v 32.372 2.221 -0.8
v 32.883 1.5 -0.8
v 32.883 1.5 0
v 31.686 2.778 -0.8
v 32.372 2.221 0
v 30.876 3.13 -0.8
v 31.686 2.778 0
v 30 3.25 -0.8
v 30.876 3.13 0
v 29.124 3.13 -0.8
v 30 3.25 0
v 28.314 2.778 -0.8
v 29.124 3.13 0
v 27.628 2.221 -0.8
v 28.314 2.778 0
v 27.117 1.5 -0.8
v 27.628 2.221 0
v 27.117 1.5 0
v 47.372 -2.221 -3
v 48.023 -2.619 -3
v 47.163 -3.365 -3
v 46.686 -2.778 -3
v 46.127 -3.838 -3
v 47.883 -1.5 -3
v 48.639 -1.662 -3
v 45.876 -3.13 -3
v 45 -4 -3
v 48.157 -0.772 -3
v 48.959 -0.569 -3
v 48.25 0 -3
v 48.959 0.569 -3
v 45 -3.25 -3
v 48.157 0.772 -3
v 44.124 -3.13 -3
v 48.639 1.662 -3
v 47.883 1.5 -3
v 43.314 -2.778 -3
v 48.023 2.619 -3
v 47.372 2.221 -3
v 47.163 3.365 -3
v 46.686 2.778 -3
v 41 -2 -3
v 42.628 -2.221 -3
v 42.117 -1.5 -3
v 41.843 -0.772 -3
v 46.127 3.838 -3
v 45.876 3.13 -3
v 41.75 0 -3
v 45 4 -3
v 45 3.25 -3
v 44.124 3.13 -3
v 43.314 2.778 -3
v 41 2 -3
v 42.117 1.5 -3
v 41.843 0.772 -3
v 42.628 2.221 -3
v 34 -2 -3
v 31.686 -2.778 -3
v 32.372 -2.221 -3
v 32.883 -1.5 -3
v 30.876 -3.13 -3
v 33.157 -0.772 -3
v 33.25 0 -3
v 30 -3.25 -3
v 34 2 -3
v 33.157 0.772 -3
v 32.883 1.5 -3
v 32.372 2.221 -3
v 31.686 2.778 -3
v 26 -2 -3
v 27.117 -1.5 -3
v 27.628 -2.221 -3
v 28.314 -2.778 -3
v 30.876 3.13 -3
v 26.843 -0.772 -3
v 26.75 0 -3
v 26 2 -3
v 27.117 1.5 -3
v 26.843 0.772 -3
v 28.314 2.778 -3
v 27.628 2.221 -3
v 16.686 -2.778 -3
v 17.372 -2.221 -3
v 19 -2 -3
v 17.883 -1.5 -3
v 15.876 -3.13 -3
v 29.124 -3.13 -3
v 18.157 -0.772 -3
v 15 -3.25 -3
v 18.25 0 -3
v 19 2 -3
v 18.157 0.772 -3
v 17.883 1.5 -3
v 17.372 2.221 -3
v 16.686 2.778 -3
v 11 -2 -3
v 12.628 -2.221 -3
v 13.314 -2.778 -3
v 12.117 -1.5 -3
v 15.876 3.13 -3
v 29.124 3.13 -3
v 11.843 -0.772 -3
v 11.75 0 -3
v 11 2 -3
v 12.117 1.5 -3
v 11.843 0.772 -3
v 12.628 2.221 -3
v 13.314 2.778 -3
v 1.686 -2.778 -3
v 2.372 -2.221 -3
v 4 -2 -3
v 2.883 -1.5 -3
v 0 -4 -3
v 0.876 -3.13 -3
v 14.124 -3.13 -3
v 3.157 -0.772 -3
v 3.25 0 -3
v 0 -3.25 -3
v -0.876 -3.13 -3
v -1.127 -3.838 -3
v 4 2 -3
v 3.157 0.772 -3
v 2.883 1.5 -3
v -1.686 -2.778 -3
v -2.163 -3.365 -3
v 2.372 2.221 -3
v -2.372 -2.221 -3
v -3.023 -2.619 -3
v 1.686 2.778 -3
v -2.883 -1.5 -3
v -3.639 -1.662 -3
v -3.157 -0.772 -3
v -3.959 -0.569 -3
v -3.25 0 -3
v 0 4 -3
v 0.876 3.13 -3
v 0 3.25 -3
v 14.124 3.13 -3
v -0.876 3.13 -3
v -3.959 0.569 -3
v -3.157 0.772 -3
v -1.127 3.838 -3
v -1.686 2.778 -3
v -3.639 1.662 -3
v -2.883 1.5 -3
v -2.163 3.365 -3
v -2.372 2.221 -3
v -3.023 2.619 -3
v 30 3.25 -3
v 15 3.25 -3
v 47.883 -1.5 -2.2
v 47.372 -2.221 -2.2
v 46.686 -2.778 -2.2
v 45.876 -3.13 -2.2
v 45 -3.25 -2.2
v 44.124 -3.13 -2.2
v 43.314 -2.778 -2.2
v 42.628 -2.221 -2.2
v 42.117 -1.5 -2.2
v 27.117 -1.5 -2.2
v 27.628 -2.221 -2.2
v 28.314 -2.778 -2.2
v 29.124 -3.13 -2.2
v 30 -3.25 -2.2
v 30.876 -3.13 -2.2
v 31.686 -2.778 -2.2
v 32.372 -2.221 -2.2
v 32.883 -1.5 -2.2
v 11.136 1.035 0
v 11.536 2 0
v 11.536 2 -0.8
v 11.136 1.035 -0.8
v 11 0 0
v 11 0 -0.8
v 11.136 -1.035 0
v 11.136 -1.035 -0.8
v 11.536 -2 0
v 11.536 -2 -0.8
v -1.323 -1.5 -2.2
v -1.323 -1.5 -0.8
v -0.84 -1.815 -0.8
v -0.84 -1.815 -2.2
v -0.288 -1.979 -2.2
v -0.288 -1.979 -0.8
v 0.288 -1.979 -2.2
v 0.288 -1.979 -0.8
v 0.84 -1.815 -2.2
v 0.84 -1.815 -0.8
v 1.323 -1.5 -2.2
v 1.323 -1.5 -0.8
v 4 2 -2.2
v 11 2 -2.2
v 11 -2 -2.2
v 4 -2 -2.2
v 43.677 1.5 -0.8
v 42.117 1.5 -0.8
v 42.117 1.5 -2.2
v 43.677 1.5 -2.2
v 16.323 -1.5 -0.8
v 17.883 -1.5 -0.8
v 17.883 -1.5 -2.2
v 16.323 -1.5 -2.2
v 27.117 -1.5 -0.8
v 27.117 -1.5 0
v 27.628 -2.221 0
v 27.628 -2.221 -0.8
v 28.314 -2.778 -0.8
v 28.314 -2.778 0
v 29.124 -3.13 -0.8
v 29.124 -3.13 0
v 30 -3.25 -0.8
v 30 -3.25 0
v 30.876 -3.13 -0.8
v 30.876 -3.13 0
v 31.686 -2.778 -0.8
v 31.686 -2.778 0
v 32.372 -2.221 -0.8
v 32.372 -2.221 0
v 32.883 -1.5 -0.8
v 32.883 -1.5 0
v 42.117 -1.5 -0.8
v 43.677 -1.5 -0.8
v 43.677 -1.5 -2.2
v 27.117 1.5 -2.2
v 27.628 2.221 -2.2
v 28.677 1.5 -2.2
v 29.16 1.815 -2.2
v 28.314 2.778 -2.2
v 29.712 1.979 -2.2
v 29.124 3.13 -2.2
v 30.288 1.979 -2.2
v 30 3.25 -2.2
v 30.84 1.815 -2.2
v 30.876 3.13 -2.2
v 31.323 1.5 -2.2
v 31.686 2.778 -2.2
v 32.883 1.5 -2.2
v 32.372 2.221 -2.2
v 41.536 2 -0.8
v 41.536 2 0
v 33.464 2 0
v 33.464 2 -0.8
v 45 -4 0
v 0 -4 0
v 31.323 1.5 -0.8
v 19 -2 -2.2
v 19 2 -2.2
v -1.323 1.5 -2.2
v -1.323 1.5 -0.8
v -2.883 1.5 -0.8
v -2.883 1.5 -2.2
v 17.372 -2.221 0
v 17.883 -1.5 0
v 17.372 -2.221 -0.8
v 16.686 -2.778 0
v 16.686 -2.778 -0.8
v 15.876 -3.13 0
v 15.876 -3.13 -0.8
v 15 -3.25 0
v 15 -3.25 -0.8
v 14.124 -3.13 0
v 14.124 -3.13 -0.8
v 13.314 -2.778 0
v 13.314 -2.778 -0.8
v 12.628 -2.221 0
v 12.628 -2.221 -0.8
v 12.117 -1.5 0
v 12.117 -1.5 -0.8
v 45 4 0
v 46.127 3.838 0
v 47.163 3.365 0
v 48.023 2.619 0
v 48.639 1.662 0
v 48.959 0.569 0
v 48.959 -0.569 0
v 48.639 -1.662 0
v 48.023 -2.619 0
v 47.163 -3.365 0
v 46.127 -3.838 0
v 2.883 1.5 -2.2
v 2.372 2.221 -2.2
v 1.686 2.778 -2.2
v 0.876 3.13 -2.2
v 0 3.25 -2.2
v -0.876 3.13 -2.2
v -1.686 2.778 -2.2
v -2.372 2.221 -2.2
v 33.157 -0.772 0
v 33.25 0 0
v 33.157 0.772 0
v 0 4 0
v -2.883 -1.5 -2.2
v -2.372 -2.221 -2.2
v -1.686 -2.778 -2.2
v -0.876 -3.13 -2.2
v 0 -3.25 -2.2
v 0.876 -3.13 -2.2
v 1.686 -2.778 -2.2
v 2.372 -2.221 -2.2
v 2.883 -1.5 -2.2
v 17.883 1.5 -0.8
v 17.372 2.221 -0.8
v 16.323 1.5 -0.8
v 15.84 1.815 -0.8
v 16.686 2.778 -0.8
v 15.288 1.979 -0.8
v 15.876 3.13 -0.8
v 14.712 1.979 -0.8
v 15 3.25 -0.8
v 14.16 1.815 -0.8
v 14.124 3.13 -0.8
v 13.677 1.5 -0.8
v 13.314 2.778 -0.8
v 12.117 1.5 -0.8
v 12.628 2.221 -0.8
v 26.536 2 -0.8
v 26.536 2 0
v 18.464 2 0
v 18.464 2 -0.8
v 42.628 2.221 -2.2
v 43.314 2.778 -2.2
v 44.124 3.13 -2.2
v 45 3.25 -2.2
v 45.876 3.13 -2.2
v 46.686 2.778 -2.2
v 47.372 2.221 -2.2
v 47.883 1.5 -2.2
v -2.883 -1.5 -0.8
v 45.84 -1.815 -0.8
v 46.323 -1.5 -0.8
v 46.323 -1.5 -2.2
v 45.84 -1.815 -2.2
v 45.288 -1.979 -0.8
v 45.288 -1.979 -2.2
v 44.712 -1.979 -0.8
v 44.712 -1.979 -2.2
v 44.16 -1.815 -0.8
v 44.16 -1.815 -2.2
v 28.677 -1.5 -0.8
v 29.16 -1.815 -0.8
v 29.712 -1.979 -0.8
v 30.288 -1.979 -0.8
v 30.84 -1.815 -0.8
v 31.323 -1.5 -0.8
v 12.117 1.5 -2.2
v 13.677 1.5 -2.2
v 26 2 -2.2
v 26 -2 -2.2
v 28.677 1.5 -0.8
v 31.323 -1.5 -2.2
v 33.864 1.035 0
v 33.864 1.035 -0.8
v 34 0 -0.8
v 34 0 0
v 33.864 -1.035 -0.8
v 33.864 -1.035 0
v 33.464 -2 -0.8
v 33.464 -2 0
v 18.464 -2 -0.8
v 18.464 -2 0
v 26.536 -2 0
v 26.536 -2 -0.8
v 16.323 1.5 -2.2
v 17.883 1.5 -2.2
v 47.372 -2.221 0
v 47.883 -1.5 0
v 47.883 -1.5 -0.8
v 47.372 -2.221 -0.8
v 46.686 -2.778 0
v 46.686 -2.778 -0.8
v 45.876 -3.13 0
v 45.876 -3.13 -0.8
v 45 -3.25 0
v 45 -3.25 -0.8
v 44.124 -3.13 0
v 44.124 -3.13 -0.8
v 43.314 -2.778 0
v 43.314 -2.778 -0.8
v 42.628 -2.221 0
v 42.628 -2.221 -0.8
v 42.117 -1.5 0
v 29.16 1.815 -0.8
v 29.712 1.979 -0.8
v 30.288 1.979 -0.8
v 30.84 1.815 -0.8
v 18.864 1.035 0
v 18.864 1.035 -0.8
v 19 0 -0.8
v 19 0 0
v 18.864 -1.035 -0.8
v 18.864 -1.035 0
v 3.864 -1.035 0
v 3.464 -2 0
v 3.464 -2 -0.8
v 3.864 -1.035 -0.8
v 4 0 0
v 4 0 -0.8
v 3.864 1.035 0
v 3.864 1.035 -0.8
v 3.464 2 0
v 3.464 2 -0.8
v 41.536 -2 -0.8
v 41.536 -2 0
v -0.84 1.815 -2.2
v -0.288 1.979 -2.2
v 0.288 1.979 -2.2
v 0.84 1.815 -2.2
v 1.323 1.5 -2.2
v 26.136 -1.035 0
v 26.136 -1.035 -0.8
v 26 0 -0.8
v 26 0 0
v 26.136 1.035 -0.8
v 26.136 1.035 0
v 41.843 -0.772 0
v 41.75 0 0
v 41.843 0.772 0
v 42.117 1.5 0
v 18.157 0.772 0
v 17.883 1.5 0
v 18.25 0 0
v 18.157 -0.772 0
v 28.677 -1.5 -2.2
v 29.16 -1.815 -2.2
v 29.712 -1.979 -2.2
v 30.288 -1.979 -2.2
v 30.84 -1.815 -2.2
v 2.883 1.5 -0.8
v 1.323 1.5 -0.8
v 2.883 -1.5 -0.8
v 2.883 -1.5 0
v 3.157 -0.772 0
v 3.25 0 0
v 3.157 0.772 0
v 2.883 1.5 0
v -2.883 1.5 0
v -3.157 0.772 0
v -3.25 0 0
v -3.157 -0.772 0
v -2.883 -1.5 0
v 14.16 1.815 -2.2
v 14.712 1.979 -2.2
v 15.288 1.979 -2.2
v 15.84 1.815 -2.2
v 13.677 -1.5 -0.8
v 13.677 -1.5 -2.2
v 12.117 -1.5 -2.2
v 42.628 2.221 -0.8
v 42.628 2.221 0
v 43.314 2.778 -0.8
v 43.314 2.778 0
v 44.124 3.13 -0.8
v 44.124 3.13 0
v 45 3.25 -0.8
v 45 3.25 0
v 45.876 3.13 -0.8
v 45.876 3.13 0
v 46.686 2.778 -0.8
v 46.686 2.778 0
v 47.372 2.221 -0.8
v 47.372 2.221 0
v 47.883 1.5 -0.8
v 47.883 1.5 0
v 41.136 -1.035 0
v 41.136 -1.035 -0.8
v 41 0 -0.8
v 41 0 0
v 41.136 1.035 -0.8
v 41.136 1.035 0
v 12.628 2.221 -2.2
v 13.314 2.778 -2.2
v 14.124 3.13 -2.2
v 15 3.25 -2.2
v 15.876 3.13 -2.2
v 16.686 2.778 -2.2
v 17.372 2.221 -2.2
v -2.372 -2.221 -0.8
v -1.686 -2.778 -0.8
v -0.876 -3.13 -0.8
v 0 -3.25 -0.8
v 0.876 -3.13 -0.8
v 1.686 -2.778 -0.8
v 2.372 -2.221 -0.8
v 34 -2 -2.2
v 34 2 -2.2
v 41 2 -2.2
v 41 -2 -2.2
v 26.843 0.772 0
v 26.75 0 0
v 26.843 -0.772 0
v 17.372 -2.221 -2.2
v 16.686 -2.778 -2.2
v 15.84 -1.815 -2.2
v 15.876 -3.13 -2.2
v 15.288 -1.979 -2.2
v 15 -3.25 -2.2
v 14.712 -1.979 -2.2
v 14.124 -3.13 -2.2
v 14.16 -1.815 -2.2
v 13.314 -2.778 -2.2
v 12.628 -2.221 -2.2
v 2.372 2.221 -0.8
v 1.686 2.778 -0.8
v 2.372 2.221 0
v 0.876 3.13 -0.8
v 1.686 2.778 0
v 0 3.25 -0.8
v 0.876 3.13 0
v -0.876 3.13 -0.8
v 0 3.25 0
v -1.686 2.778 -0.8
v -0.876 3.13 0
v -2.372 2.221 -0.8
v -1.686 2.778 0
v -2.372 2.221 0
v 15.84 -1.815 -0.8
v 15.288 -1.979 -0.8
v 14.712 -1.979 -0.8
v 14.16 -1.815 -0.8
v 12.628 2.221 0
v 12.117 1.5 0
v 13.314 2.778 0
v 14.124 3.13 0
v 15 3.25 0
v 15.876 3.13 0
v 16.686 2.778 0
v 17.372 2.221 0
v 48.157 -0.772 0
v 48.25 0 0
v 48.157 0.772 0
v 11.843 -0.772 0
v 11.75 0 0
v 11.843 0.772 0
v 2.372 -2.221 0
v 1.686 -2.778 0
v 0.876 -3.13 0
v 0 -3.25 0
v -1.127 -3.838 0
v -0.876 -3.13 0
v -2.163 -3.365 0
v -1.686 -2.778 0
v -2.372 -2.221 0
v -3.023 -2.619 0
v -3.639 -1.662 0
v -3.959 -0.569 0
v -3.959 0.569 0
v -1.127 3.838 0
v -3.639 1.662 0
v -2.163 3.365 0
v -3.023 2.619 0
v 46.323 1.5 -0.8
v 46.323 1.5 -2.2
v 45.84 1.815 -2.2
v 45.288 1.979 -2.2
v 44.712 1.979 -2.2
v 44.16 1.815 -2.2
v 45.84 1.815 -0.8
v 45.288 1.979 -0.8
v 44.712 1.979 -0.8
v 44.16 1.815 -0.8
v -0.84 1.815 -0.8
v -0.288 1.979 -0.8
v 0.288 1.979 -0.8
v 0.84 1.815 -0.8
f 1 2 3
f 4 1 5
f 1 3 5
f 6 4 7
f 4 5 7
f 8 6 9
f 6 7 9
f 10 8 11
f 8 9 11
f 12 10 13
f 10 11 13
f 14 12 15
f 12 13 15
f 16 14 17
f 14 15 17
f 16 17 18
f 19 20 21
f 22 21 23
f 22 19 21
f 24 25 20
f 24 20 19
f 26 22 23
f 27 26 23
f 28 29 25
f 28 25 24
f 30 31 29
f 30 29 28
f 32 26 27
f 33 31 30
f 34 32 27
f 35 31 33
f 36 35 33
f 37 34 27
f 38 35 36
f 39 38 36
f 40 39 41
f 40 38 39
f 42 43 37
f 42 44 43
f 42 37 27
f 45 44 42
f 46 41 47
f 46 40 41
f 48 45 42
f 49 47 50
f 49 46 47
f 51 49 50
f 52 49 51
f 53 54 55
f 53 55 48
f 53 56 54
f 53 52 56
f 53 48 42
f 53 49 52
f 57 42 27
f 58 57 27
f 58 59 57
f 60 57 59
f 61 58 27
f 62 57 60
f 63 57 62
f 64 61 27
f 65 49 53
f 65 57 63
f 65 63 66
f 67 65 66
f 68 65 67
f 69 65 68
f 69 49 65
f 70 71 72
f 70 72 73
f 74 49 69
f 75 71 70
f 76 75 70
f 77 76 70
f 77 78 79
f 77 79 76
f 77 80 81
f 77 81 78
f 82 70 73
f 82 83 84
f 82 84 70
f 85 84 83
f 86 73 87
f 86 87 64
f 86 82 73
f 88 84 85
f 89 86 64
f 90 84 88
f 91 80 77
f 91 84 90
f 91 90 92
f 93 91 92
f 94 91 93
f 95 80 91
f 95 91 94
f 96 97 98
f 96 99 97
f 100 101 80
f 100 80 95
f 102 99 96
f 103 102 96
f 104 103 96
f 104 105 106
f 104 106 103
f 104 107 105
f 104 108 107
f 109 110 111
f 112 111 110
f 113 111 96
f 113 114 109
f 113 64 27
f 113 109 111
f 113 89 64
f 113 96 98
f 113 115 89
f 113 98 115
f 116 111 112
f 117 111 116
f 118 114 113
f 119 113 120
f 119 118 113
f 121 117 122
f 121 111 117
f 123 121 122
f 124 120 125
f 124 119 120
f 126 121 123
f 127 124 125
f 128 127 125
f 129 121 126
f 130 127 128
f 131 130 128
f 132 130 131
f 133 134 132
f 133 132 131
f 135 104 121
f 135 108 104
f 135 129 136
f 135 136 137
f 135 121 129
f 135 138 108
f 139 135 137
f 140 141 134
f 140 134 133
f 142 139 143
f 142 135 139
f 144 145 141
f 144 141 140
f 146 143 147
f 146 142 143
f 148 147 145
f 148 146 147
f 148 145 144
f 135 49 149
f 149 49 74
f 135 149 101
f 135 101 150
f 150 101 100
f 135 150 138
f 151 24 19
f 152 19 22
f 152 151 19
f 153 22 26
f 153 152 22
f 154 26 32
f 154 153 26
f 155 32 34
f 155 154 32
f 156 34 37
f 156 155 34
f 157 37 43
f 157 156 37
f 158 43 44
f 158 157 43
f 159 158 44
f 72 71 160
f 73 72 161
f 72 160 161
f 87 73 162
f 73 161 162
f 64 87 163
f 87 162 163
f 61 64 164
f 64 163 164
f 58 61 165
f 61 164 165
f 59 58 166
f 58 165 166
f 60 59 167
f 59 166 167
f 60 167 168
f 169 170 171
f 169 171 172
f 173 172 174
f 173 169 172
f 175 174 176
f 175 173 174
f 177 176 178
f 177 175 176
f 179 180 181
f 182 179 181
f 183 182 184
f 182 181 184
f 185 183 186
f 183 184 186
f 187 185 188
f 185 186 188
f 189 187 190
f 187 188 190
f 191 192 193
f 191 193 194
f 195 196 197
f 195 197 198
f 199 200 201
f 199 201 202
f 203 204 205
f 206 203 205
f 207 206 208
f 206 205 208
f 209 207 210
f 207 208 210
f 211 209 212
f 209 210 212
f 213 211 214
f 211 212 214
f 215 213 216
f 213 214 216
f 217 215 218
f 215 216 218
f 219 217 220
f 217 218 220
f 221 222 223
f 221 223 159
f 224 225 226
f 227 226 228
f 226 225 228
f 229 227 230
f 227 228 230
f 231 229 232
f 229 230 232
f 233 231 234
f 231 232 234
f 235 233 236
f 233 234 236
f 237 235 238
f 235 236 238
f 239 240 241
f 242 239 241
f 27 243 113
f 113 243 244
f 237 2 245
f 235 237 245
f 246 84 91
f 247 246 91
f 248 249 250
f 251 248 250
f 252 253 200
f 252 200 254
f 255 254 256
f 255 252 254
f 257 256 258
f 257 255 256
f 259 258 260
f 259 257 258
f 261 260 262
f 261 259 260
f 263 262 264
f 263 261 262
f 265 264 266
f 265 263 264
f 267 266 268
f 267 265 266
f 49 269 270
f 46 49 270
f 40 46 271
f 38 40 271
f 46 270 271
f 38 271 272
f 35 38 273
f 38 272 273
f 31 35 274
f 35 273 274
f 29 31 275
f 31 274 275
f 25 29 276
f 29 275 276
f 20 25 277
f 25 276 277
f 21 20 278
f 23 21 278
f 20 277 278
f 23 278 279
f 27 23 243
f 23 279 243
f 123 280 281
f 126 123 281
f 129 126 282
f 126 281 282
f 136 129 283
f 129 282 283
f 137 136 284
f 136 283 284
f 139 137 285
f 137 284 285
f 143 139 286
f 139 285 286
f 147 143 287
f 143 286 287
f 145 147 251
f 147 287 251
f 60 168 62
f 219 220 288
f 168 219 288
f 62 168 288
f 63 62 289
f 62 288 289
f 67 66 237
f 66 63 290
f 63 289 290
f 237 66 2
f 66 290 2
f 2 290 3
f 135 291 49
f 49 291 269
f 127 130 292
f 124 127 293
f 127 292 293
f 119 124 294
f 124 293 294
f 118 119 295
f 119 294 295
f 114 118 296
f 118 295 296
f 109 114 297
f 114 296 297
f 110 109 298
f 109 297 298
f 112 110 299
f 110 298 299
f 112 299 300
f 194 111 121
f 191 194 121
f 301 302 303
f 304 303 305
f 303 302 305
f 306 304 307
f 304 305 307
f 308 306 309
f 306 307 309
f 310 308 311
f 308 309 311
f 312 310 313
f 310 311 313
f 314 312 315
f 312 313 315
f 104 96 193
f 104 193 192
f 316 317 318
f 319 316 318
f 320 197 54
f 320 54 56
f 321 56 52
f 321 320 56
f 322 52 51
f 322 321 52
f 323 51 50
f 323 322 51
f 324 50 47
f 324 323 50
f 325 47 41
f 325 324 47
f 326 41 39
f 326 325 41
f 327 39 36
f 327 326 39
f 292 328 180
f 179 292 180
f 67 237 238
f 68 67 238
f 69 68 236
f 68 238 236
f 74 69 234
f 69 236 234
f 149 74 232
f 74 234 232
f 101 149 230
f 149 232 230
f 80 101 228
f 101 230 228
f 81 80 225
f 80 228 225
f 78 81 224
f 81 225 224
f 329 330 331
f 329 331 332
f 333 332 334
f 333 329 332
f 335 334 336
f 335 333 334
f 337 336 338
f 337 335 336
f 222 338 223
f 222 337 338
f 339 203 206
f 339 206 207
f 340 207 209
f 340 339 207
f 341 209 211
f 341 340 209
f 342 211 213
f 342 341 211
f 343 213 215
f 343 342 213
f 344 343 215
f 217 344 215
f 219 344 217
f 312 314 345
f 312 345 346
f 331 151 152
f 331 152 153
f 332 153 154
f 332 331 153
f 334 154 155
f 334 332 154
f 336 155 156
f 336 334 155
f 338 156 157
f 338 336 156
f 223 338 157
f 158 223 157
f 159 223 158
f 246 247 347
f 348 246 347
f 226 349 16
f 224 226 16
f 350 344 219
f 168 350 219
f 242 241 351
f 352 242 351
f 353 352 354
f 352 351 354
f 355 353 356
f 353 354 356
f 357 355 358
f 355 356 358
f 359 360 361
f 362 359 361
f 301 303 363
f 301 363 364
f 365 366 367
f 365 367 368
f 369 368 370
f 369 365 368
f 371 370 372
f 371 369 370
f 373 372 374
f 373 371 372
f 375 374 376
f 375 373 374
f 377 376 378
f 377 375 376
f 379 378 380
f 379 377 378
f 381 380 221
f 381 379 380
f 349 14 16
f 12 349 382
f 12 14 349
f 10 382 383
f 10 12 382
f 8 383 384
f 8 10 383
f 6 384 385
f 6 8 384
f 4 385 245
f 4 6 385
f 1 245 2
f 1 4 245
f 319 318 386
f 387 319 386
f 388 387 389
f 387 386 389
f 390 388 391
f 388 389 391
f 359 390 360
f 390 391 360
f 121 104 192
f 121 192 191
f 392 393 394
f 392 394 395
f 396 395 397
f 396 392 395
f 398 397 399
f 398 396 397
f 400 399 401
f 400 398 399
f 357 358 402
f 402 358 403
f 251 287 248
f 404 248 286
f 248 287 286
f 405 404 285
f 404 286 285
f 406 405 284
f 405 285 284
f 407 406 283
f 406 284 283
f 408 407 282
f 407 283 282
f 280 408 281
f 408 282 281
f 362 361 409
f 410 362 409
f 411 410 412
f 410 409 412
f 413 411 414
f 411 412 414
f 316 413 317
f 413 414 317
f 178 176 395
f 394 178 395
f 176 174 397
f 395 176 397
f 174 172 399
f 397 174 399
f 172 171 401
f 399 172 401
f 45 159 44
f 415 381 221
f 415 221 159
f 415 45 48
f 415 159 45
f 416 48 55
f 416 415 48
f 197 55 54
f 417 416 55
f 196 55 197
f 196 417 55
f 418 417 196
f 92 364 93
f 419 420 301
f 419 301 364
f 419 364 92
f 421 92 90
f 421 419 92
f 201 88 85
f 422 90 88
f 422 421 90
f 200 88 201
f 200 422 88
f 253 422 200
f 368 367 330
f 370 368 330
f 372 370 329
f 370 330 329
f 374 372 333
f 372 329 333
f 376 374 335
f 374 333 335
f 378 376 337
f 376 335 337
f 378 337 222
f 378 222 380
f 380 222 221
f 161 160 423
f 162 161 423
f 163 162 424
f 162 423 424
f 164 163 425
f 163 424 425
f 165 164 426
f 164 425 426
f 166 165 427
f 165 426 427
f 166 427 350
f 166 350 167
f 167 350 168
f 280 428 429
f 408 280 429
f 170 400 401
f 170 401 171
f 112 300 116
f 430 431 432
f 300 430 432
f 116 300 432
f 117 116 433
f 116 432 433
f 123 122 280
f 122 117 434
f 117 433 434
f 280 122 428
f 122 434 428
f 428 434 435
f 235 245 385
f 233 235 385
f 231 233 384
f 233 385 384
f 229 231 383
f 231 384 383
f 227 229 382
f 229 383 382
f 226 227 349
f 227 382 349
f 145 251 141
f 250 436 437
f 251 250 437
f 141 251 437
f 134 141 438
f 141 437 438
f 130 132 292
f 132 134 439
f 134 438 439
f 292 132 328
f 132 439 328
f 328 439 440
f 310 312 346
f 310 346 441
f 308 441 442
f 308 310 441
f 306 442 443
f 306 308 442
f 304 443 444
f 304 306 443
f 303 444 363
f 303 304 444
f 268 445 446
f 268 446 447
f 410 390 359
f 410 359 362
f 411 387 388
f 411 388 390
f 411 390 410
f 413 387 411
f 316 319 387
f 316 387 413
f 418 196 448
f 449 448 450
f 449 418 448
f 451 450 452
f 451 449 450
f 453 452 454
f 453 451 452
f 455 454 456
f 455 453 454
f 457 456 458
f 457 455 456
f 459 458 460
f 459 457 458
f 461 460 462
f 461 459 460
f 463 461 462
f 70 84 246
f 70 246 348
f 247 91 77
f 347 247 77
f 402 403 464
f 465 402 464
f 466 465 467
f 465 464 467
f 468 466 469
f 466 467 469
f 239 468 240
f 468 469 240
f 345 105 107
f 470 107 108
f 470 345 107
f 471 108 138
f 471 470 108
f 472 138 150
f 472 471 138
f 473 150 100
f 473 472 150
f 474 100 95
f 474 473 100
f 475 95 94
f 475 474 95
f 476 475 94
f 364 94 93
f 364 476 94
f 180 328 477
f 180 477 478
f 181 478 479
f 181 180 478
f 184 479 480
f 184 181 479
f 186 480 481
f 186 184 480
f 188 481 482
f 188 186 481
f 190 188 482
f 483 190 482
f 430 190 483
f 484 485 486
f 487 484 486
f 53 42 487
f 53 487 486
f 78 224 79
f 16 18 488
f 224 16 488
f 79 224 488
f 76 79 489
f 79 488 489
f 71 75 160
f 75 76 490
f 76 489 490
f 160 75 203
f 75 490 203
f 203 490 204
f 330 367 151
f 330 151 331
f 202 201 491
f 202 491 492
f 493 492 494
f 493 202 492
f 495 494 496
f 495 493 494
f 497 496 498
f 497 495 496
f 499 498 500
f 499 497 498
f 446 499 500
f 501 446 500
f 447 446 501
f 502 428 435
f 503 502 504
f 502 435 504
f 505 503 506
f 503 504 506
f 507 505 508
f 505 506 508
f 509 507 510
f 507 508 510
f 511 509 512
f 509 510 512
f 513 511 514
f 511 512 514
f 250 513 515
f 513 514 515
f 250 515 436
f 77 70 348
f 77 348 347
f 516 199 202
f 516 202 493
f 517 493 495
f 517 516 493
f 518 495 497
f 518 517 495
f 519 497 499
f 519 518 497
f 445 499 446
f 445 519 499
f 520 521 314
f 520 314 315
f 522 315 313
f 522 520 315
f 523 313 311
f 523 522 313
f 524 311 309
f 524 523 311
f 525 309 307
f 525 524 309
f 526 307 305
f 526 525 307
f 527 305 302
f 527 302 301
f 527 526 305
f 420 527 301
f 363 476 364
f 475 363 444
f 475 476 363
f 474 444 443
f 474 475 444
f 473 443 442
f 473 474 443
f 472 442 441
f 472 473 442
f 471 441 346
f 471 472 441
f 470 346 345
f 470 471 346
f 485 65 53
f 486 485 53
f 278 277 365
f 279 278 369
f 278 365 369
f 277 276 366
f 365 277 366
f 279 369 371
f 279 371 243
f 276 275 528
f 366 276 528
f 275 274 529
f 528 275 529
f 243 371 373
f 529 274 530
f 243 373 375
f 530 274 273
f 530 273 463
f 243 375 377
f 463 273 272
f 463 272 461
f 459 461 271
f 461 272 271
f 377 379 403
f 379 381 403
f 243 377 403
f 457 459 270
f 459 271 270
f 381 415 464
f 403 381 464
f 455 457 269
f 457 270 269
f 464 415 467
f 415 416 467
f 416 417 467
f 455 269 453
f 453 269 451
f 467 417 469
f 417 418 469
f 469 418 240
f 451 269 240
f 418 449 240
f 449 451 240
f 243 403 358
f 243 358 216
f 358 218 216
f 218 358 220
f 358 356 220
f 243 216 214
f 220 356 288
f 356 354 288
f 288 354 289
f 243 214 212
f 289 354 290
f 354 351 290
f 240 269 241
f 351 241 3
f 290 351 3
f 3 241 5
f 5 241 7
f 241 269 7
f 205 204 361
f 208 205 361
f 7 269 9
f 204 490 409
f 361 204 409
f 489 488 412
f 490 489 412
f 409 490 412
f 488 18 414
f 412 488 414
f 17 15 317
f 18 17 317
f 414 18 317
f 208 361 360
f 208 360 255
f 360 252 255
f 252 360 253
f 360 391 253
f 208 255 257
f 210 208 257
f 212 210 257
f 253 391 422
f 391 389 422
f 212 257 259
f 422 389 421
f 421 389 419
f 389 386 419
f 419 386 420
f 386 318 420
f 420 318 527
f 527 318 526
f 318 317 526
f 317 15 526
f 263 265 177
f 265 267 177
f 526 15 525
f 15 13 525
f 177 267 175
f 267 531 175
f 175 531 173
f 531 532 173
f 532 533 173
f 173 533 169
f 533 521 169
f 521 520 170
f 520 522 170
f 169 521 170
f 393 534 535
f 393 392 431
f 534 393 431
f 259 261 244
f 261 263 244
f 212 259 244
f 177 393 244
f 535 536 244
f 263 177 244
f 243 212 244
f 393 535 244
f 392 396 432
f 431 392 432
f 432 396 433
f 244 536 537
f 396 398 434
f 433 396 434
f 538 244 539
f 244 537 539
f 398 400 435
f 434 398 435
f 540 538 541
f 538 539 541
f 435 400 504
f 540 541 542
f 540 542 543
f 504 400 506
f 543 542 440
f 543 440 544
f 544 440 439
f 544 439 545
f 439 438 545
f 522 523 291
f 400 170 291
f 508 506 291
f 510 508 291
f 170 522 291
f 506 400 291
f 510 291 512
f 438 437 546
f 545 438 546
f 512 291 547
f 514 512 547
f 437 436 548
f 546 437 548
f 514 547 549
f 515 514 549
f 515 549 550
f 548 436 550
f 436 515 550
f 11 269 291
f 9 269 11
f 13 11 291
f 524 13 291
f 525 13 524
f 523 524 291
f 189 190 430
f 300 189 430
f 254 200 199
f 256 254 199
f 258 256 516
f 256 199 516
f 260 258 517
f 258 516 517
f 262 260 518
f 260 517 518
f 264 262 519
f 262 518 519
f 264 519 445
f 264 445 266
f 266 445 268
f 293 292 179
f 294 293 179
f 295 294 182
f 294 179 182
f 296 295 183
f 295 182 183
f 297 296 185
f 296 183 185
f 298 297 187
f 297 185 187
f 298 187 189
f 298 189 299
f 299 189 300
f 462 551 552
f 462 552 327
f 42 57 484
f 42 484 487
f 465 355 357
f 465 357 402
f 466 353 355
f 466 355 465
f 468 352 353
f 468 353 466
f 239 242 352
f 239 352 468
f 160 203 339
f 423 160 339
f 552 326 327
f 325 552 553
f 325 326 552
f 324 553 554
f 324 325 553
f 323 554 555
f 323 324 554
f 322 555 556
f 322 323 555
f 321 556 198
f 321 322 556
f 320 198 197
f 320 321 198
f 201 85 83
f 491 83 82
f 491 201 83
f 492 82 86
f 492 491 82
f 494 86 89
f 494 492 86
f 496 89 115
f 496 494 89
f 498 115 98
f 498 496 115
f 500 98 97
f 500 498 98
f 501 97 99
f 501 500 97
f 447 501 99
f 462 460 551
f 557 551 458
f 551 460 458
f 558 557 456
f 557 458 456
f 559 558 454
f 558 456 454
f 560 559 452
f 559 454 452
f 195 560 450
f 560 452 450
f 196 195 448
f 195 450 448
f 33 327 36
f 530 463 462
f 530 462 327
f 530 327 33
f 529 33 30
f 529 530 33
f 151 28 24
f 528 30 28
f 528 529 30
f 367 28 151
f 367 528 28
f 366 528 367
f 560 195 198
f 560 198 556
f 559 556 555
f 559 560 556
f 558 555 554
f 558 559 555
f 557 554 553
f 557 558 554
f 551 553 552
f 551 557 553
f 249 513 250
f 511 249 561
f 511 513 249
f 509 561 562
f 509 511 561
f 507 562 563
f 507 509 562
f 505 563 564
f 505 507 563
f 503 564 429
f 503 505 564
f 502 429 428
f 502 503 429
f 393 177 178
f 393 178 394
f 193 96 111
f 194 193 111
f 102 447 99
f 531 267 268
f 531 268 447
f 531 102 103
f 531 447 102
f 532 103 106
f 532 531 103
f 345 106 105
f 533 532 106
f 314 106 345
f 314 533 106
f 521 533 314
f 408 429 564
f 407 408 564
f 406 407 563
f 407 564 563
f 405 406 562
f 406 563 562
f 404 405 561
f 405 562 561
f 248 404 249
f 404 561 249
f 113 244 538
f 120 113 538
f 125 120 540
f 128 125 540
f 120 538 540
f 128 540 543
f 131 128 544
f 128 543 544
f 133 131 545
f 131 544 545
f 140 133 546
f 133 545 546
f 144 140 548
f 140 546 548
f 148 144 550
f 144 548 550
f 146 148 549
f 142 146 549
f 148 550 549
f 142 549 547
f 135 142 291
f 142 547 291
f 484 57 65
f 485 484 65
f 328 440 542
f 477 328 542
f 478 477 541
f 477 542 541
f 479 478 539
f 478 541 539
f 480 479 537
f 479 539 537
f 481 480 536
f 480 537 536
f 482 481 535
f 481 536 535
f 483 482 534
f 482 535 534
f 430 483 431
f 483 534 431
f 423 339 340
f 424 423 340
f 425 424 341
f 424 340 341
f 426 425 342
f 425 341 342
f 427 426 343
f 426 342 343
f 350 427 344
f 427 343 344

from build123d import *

# Parameters (mm, degrees)
EXTRUDE_1_DEPTH          = 3
CUT_EXTRUDE_1_REACH      = 51.254
SKETCH_3_R               = 3.25
CUT_EXTRUDE_2_DEPTH      = 0.8
CUT_EXTRUDE_START        = -2.2
SKETCH_3_2_R             = 3.25
CUT_EXTRUDE_3_DEPTH      = 0.8
CUT_EXTRUDE_4_DEPTH      = 0.8
SKETCH_5_W               = 7
SKETCH_5_H               = 4
CUT_EXTRUDE_6_DEPTH      = 0.8
MIRROR_2_COPY_1_REACH    = 51.254
MIRROR_2_COPY_2_SKETCH_R = 3.25
MIRROR_2_COPY_2_DEPTH    = 0.8
MIRROR_START             = -2.2
MIRROR_2_COPY_3_SKETCH_R = 3.25
MIRROR_2_COPY_3_DEPTH    = 0.8


with BuildPart() as part:
    # 草图1 → 凸台-拉伸1 (new body)
    with BuildSketch(Plane.XY):
        with BuildLine():
            Line((0, 4), (45, 4))
            ThreePointArc((45, 4), (49, 0), (45, -4))
            Line((45, -4), (0, -4))
            ThreePointArc((0, -4), (-4, 0), (0, 4))
        make_face()
    extrude(amount=-EXTRUDE_1_DEPTH)

    # 草图2 → 切除-拉伸1 (cut, up to next)
    with BuildSketch(Plane.XY, mode=Mode.PRIVATE) as cut_extrude_1_sk1:
        with BuildLine():
            Line((1.322875656, -1.5), (2.883140649, -1.5))
            ThreePointArc((2.883140649, -1.5), (3.25, 0), (2.883140649, 1.5))
            Line((2.883140649, 1.5), (1.322875656, 1.5))
            ThreePointArc((1.322875656, 1.5), (0, 2), (-1.322875656, 1.5))
            Line((-1.322875656, 1.5), (-2.883140649, 1.5))
            ThreePointArc((-2.883140649, 1.5), (-3.25, 0), (-2.883140649, -1.5))
            Line((-2.883140649, -1.5), (-1.322875656, -1.5))
            ThreePointArc((-1.322875656, -1.5), (0, -2), (1.322875656, -1.5))
        make_face()
    cut_extrude_1_tool1 = extrude(cut_extrude_1_sk1.sketch, amount=-CUT_EXTRUDE_1_REACH, mode=Mode.PRIVATE) & part.part
    cut_extrude_1 = cut_extrude_1_tool1.solids().sort_by_distance((0, 0, 0))[0]
    add(cut_extrude_1, mode=Mode.SUBTRACT)

    # 草图3 → 切除-拉伸2 (cut)
    with BuildSketch(Plane.XY):
        Circle(SKETCH_3_R)
    cut_extrude_2 = extrude(amount=-CUT_EXTRUDE_2_DEPTH, mode=Mode.SUBTRACT)

    # 草图3<2> → 切除-拉伸3 (cut)
    with BuildSketch(Plane.XY.offset(CUT_EXTRUDE_START)):
        Circle(SKETCH_3_2_R)
    cut_extrude_3 = extrude(amount=-CUT_EXTRUDE_3_DEPTH, mode=Mode.SUBTRACT)

    # 草图4 → 切除-拉伸4 (cut)
    with BuildSketch(Plane.XY):
        with BuildLine():
            Line((3.464101615, 2), (11.535898385, 2))
            ThreePointArc((11.535898385, 2), (11, 0), (11.535898385, -2))
            Line((11.535898385, -2), (3.464101615, -2))
            ThreePointArc((3.464101615, -2), (4, 0), (3.464101615, 2))
        make_face()
    cut_extrude_4 = extrude(amount=-CUT_EXTRUDE_4_DEPTH, mode=Mode.SUBTRACT)

    # 草图5 → 切除-拉伸6 (cut)
    with BuildSketch(Plane(origin=(0, 0, -3), x_dir=(-1, 0, 0), z_dir=(0, 0, -1))):
        with Locations((-7.5, 0)):
            Rectangle(SKETCH_5_W, SKETCH_5_H)
    cut_extrude_6 = extrude(amount=-CUT_EXTRUDE_6_DEPTH, mode=Mode.SUBTRACT)

    # 镜向1: 切除-拉伸1, 切除-拉伸2, 切除-拉伸3 across plane
    add(cut_extrude_1.mirror(Plane(origin=(7.5, 0, 0), x_dir=(0, 0, 1), z_dir=(1, 0, 0))), mode=Mode.SUBTRACT)
    add(cut_extrude_2.mirror(Plane(origin=(7.5, 0, 0), x_dir=(0, 0, 1), z_dir=(1, 0, 0))), mode=Mode.SUBTRACT)
    add(cut_extrude_3.mirror(Plane(origin=(7.5, 0, 0), x_dir=(0, 0, 1), z_dir=(1, 0, 0))), mode=Mode.SUBTRACT)

    # 镜向2: 切除-拉伸1, 切除-拉伸2, 切除-拉伸3 across plane
    add(cut_extrude_1.mirror(Plane(origin=(22.5, 0, 0), x_dir=(0, 0, 1), z_dir=(1, 0, 0))), mode=Mode.SUBTRACT)
    add(cut_extrude_2.mirror(Plane(origin=(22.5, 0, 0), x_dir=(0, 0, 1), z_dir=(1, 0, 0))), mode=Mode.SUBTRACT)
    add(cut_extrude_3.mirror(Plane(origin=(22.5, 0, 0), x_dir=(0, 0, 1), z_dir=(1, 0, 0))), mode=Mode.SUBTRACT)

    # 镜向2 copy 1 sketch → 镜向2 copy 1 (cut, up to next)
    with BuildSketch(Plane(origin=(30, 0, 0), x_dir=(1, 0, 0), z_dir=(0, 0, 1)), mode=Mode.PRIVATE) as mirror_2_copy_1_sk1:
        with BuildLine():
            Line((1.322875656, -1.5), (2.883140649, -1.5))
            ThreePointArc((2.883140649, -1.5), (3.25, 0), (2.883140649, 1.5))
            Line((2.883140649, 1.5), (1.322875656, 1.5))
            ThreePointArc((1.322875656, 1.5), (0, 2), (-1.322875656, 1.5))
            Line((-1.322875656, 1.5), (-2.883140649, 1.5))
            ThreePointArc((-2.883140649, 1.5), (-3.25, 0), (-2.883140649, -1.5))
            Line((-2.883140649, -1.5), (-1.322875656, -1.5))
            ThreePointArc((-1.322875656, -1.5), (0, -2), (1.322875656, -1.5))
        make_face()
    mirror_2_copy_1_tool1 = extrude(mirror_2_copy_1_sk1.sketch, amount=-MIRROR_2_COPY_1_REACH, mode=Mode.PRIVATE) & part.part
    add(mirror_2_copy_1_tool1.solids().sort_by_distance((30, 0, 0))[0], mode=Mode.SUBTRACT)

    # 镜向2 copy 2 sketch → 镜向2 copy 2 (cut)
    with BuildSketch(Plane(origin=(30, 0, 0), x_dir=(1, 0, 0), z_dir=(0, 0, 1))):
        Circle(MIRROR_2_COPY_2_SKETCH_R)
    extrude(amount=-MIRROR_2_COPY_2_DEPTH, mode=Mode.SUBTRACT)

    # 镜向2 copy 3 sketch → 镜向2 copy 3 (cut)
    with BuildSketch(Plane(origin=(30, 0, 0), x_dir=(1, 0, 0), z_dir=(0, 0, 1)).offset(MIRROR_START)):
        Circle(MIRROR_2_COPY_3_SKETCH_R)
    extrude(amount=-MIRROR_2_COPY_3_DEPTH, mode=Mode.SUBTRACT)

    # 镜向3: 切除-拉伸4, 切除-拉伸6 across plane
    add(cut_extrude_4.mirror(Plane(origin=(15, 0, 0), x_dir=(0, 0, 1), z_dir=(1, 0, 0))), mode=Mode.SUBTRACT)
    add(cut_extrude_6.mirror(Plane(origin=(15, 0, 0), x_dir=(0, 0, 1), z_dir=(1, 0, 0))), mode=Mode.SUBTRACT)

    # 镜向4: 切除-拉伸4, 切除-拉伸6 across plane
    add(cut_extrude_4.mirror(Plane(origin=(22.5, 0, 0), x_dir=(0, 0, 1), z_dir=(1, 0, 0))), mode=Mode.SUBTRACT)
    add(cut_extrude_6.mirror(Plane(origin=(22.5, 0, 0), x_dir=(0, 0, 1), z_dir=(1, 0, 0))), mode=Mode.SUBTRACT)


solid = part.part
